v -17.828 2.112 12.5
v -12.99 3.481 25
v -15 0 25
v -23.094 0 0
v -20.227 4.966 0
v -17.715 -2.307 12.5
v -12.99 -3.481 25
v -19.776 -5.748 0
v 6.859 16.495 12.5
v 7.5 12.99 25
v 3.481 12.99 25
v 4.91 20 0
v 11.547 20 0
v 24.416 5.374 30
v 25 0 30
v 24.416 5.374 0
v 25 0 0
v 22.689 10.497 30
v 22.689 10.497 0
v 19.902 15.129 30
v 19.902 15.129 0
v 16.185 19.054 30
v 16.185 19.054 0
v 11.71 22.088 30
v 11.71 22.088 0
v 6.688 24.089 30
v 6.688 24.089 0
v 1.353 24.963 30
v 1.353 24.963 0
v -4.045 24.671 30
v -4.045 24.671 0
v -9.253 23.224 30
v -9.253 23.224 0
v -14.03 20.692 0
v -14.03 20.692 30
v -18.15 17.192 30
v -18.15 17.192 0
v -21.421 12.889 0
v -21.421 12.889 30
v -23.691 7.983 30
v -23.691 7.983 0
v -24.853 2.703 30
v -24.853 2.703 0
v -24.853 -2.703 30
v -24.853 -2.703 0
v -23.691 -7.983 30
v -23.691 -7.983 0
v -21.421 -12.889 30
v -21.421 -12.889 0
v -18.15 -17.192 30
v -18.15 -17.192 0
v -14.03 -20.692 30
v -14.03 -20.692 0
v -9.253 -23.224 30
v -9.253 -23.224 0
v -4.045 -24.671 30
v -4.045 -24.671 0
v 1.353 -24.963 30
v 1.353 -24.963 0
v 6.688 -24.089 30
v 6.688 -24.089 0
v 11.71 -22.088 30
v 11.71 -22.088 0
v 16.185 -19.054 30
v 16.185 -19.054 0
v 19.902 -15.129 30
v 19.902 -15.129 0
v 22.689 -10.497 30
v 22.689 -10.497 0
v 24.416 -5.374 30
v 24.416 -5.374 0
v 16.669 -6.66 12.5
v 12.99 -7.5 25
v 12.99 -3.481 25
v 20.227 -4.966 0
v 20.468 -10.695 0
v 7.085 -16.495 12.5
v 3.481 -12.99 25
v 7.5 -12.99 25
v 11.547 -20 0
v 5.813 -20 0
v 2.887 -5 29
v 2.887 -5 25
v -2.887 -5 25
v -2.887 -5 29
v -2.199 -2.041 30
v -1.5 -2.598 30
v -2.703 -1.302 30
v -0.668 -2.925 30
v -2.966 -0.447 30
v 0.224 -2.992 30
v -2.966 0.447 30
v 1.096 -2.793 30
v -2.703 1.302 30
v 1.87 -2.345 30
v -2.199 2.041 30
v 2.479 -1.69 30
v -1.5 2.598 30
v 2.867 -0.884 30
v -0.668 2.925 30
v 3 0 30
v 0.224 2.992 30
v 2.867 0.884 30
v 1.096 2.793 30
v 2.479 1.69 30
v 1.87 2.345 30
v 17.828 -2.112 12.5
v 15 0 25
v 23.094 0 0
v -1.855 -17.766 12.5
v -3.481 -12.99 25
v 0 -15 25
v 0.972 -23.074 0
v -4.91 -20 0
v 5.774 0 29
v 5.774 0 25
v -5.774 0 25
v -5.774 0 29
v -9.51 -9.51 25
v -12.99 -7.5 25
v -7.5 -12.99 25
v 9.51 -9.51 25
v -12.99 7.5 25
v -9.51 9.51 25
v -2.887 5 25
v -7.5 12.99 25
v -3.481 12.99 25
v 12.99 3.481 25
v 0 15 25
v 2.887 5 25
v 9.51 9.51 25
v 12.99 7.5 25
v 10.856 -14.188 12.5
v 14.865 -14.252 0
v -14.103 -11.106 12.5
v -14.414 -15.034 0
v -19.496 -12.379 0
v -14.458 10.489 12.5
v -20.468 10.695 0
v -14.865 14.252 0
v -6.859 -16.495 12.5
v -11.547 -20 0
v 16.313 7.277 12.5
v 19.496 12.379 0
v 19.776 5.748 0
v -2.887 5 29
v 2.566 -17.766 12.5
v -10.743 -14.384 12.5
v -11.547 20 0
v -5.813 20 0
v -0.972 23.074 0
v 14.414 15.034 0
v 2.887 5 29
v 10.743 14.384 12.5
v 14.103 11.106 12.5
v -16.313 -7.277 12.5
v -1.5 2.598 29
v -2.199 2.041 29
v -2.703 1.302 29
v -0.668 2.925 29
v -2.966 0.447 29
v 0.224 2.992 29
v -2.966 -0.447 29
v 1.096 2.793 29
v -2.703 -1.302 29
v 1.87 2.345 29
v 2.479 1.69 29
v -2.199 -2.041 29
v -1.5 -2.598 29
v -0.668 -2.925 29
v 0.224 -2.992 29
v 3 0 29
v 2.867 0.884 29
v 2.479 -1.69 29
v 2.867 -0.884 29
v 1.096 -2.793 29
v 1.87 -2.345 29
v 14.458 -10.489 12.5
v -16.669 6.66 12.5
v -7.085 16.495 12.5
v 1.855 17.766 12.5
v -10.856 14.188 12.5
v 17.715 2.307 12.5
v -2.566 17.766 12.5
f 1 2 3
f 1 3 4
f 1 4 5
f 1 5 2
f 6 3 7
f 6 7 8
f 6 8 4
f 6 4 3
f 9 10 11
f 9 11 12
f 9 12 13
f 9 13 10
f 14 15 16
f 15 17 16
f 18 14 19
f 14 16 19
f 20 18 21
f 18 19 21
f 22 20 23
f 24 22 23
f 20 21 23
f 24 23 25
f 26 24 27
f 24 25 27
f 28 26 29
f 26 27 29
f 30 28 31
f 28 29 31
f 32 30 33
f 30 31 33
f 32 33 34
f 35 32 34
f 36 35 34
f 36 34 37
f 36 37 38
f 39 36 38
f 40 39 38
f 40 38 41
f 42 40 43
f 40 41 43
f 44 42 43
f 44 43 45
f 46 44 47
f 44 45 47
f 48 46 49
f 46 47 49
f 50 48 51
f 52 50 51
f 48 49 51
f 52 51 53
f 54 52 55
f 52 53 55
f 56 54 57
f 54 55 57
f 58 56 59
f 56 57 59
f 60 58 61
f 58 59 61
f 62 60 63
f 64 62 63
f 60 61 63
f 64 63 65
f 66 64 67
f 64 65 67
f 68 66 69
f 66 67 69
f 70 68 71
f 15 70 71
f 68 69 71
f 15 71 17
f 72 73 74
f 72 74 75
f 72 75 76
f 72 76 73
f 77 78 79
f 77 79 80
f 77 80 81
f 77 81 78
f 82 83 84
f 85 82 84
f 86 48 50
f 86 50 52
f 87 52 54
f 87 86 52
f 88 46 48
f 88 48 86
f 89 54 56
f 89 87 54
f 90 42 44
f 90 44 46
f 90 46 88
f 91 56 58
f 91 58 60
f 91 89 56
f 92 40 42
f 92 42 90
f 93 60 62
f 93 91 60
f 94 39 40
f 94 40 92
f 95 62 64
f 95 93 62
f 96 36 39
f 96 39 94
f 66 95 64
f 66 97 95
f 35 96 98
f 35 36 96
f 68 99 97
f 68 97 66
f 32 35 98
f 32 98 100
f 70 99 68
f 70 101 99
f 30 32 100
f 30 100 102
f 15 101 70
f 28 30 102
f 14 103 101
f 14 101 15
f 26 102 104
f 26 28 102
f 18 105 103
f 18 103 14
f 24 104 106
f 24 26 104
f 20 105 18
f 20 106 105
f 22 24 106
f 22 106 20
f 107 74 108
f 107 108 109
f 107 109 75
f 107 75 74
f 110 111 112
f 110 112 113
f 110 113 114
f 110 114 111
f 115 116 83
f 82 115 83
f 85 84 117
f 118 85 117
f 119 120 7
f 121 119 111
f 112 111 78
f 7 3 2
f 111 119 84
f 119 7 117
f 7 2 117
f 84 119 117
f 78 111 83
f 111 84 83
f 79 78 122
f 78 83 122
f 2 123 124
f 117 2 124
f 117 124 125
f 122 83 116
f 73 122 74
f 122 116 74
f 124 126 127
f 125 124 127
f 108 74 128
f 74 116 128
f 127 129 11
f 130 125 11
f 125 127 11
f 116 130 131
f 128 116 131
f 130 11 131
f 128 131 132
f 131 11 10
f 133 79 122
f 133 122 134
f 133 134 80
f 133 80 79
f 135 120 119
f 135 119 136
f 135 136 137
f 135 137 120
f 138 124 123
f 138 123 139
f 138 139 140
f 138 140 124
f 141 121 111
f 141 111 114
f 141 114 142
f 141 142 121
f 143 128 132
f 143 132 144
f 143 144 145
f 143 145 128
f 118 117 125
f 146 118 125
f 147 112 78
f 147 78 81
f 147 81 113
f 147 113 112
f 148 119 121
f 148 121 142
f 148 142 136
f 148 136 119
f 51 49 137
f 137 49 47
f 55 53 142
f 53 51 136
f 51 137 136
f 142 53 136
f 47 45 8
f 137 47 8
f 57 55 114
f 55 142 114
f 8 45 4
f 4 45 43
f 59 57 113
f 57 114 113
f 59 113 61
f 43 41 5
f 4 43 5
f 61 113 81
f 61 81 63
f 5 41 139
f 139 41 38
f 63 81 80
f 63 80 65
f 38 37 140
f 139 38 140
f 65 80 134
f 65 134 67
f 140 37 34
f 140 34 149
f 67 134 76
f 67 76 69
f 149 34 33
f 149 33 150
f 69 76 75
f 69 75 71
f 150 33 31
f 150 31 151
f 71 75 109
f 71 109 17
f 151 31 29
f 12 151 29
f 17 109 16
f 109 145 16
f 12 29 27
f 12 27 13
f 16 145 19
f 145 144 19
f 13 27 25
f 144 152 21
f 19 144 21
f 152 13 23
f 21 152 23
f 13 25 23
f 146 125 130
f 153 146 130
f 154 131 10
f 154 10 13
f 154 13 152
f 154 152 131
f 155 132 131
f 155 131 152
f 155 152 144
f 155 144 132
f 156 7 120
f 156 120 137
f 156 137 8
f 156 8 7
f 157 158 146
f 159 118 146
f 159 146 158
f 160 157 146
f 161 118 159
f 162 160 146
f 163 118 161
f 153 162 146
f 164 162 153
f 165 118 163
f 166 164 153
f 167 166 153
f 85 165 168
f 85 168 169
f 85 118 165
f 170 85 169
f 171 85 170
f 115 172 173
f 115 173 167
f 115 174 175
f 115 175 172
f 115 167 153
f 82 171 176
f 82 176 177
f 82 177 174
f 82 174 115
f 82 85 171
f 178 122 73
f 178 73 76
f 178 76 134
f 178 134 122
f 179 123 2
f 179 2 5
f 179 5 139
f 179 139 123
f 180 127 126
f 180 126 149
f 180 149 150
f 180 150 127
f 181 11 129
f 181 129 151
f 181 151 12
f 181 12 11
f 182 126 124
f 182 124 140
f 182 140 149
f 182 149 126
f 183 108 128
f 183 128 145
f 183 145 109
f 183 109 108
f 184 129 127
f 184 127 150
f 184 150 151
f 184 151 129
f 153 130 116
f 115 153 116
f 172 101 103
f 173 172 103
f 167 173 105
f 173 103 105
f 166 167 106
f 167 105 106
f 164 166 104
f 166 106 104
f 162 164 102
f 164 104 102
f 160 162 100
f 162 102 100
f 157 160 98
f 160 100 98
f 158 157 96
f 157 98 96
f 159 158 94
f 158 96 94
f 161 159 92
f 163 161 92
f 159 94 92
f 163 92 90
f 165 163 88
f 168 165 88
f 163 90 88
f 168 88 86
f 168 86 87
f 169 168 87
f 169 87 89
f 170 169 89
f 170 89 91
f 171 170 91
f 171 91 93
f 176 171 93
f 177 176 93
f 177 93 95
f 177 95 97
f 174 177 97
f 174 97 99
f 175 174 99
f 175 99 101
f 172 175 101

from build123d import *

# Parameters (mm, degrees)
F0_R      = 25
F1_DEPTH  = 25
F5_R      = 25
F6_DEPTH  = 5
F8_DEPTH  = 4
F9_R      = 3
F10_DEPTH = 25


with BuildPart() as f1:
    # F0 (on Top) → F1 (new body)
    with BuildSketch(Plane.XY):
        Circle(F0_R)
    extrude(amount=F1_DEPTH)

    # F3 (on face) → F4 section 0
    with BuildSketch(Plane.XY.offset(25)):
        Polygon((-3.4807621135, 12.9903810568), (-7.5, 12.9903810568), (-9.5096189432, 9.5096189432), (-12.9903810568, 7.5), (-12.9903810568, 3.4807621135), (-15, 0), (-12.9903810568, -3.4807621135), (-12.9903810568, -7.5), (-9.5096189432, -9.5096189432), (-7.5, -12.9903810568), (-3.4807621135, -12.9903810568), (0, -15), (3.4807621135, -12.9903810568), (7.5, -12.9903810568), (9.5096189432, -9.5096189432), (12.9903810568, -7.5), (12.9903810568, -3.4807621135), (15, 0), (12.9903810568, 3.4807621135), (12.9903810568, 7.5), (9.5096189432, 9.5096189432), (7.5, 12.9903810568), (3.4807621135, 12.9903810568), (0, 15), align=None)
    # F2 (on face) → F4 section 1
    with BuildSketch(Plane(origin=(0, 0, 0), x_dir=(1, 0, 0), z_dir=(0, 0, -1))):
        Polygon((-4.9102076485, 20), (-11.5470053838, 20), (-14.414081985, 15.0340776575), (-19.4962760907, 12.3785520935), (-19.7756118999, 5.7476354385), (-23.0940107676, 0), (-20.2269341664, -4.9659223425), (-20.4682786203, -10.694994327), (-14.8654042514, -14.2523645615), (-11.5470053838, -20), (-5.8128521814, -20), (-0.9720025297, -23.0735464204), (4.9102076485, -20), (11.5470053838, -20), (14.414081985, -15.0340776575), (19.4962760907, -12.3785520935), (19.7756118999, -5.7476354385), (23.0940107676, 0), (20.2269341664, 4.9659223425), (20.4682786203, 10.694994327), (14.8654042514, 14.2523645615), (11.5470053838, 20), (5.8128521814, 20), (0.9720025297, 23.0735464204), align=None)
    loft(mode=Mode.SUBTRACT)

    # F5 (on face) → F6 (join)
    with BuildSketch(Plane.XY.offset(25)):
        Circle(F5_R)
    extrude(amount=F6_DEPTH)

    # F7 (on face) → F8 (cut)
    with BuildSketch(Plane(origin=(0, 0, 25), x_dir=(1, 0, 0), z_dir=(0, 0, -1))):
        Polygon((2.8867513459, 5), (-2.8867513459, 5), (-5.7735026919, 0), (-2.8867513459, -5), (2.8867513459, -5), (5.7735026919, 0), align=None)
    extrude(amount=-F8_DEPTH, mode=Mode.SUBTRACT)

    # F9 (on face) → F10 (cut)
    with BuildSketch(Plane.XY.offset(30)):
        Circle(F9_R)
    extrude(amount=-F10_DEPTH, mode=Mode.SUBTRACT)


solid = f1.part
